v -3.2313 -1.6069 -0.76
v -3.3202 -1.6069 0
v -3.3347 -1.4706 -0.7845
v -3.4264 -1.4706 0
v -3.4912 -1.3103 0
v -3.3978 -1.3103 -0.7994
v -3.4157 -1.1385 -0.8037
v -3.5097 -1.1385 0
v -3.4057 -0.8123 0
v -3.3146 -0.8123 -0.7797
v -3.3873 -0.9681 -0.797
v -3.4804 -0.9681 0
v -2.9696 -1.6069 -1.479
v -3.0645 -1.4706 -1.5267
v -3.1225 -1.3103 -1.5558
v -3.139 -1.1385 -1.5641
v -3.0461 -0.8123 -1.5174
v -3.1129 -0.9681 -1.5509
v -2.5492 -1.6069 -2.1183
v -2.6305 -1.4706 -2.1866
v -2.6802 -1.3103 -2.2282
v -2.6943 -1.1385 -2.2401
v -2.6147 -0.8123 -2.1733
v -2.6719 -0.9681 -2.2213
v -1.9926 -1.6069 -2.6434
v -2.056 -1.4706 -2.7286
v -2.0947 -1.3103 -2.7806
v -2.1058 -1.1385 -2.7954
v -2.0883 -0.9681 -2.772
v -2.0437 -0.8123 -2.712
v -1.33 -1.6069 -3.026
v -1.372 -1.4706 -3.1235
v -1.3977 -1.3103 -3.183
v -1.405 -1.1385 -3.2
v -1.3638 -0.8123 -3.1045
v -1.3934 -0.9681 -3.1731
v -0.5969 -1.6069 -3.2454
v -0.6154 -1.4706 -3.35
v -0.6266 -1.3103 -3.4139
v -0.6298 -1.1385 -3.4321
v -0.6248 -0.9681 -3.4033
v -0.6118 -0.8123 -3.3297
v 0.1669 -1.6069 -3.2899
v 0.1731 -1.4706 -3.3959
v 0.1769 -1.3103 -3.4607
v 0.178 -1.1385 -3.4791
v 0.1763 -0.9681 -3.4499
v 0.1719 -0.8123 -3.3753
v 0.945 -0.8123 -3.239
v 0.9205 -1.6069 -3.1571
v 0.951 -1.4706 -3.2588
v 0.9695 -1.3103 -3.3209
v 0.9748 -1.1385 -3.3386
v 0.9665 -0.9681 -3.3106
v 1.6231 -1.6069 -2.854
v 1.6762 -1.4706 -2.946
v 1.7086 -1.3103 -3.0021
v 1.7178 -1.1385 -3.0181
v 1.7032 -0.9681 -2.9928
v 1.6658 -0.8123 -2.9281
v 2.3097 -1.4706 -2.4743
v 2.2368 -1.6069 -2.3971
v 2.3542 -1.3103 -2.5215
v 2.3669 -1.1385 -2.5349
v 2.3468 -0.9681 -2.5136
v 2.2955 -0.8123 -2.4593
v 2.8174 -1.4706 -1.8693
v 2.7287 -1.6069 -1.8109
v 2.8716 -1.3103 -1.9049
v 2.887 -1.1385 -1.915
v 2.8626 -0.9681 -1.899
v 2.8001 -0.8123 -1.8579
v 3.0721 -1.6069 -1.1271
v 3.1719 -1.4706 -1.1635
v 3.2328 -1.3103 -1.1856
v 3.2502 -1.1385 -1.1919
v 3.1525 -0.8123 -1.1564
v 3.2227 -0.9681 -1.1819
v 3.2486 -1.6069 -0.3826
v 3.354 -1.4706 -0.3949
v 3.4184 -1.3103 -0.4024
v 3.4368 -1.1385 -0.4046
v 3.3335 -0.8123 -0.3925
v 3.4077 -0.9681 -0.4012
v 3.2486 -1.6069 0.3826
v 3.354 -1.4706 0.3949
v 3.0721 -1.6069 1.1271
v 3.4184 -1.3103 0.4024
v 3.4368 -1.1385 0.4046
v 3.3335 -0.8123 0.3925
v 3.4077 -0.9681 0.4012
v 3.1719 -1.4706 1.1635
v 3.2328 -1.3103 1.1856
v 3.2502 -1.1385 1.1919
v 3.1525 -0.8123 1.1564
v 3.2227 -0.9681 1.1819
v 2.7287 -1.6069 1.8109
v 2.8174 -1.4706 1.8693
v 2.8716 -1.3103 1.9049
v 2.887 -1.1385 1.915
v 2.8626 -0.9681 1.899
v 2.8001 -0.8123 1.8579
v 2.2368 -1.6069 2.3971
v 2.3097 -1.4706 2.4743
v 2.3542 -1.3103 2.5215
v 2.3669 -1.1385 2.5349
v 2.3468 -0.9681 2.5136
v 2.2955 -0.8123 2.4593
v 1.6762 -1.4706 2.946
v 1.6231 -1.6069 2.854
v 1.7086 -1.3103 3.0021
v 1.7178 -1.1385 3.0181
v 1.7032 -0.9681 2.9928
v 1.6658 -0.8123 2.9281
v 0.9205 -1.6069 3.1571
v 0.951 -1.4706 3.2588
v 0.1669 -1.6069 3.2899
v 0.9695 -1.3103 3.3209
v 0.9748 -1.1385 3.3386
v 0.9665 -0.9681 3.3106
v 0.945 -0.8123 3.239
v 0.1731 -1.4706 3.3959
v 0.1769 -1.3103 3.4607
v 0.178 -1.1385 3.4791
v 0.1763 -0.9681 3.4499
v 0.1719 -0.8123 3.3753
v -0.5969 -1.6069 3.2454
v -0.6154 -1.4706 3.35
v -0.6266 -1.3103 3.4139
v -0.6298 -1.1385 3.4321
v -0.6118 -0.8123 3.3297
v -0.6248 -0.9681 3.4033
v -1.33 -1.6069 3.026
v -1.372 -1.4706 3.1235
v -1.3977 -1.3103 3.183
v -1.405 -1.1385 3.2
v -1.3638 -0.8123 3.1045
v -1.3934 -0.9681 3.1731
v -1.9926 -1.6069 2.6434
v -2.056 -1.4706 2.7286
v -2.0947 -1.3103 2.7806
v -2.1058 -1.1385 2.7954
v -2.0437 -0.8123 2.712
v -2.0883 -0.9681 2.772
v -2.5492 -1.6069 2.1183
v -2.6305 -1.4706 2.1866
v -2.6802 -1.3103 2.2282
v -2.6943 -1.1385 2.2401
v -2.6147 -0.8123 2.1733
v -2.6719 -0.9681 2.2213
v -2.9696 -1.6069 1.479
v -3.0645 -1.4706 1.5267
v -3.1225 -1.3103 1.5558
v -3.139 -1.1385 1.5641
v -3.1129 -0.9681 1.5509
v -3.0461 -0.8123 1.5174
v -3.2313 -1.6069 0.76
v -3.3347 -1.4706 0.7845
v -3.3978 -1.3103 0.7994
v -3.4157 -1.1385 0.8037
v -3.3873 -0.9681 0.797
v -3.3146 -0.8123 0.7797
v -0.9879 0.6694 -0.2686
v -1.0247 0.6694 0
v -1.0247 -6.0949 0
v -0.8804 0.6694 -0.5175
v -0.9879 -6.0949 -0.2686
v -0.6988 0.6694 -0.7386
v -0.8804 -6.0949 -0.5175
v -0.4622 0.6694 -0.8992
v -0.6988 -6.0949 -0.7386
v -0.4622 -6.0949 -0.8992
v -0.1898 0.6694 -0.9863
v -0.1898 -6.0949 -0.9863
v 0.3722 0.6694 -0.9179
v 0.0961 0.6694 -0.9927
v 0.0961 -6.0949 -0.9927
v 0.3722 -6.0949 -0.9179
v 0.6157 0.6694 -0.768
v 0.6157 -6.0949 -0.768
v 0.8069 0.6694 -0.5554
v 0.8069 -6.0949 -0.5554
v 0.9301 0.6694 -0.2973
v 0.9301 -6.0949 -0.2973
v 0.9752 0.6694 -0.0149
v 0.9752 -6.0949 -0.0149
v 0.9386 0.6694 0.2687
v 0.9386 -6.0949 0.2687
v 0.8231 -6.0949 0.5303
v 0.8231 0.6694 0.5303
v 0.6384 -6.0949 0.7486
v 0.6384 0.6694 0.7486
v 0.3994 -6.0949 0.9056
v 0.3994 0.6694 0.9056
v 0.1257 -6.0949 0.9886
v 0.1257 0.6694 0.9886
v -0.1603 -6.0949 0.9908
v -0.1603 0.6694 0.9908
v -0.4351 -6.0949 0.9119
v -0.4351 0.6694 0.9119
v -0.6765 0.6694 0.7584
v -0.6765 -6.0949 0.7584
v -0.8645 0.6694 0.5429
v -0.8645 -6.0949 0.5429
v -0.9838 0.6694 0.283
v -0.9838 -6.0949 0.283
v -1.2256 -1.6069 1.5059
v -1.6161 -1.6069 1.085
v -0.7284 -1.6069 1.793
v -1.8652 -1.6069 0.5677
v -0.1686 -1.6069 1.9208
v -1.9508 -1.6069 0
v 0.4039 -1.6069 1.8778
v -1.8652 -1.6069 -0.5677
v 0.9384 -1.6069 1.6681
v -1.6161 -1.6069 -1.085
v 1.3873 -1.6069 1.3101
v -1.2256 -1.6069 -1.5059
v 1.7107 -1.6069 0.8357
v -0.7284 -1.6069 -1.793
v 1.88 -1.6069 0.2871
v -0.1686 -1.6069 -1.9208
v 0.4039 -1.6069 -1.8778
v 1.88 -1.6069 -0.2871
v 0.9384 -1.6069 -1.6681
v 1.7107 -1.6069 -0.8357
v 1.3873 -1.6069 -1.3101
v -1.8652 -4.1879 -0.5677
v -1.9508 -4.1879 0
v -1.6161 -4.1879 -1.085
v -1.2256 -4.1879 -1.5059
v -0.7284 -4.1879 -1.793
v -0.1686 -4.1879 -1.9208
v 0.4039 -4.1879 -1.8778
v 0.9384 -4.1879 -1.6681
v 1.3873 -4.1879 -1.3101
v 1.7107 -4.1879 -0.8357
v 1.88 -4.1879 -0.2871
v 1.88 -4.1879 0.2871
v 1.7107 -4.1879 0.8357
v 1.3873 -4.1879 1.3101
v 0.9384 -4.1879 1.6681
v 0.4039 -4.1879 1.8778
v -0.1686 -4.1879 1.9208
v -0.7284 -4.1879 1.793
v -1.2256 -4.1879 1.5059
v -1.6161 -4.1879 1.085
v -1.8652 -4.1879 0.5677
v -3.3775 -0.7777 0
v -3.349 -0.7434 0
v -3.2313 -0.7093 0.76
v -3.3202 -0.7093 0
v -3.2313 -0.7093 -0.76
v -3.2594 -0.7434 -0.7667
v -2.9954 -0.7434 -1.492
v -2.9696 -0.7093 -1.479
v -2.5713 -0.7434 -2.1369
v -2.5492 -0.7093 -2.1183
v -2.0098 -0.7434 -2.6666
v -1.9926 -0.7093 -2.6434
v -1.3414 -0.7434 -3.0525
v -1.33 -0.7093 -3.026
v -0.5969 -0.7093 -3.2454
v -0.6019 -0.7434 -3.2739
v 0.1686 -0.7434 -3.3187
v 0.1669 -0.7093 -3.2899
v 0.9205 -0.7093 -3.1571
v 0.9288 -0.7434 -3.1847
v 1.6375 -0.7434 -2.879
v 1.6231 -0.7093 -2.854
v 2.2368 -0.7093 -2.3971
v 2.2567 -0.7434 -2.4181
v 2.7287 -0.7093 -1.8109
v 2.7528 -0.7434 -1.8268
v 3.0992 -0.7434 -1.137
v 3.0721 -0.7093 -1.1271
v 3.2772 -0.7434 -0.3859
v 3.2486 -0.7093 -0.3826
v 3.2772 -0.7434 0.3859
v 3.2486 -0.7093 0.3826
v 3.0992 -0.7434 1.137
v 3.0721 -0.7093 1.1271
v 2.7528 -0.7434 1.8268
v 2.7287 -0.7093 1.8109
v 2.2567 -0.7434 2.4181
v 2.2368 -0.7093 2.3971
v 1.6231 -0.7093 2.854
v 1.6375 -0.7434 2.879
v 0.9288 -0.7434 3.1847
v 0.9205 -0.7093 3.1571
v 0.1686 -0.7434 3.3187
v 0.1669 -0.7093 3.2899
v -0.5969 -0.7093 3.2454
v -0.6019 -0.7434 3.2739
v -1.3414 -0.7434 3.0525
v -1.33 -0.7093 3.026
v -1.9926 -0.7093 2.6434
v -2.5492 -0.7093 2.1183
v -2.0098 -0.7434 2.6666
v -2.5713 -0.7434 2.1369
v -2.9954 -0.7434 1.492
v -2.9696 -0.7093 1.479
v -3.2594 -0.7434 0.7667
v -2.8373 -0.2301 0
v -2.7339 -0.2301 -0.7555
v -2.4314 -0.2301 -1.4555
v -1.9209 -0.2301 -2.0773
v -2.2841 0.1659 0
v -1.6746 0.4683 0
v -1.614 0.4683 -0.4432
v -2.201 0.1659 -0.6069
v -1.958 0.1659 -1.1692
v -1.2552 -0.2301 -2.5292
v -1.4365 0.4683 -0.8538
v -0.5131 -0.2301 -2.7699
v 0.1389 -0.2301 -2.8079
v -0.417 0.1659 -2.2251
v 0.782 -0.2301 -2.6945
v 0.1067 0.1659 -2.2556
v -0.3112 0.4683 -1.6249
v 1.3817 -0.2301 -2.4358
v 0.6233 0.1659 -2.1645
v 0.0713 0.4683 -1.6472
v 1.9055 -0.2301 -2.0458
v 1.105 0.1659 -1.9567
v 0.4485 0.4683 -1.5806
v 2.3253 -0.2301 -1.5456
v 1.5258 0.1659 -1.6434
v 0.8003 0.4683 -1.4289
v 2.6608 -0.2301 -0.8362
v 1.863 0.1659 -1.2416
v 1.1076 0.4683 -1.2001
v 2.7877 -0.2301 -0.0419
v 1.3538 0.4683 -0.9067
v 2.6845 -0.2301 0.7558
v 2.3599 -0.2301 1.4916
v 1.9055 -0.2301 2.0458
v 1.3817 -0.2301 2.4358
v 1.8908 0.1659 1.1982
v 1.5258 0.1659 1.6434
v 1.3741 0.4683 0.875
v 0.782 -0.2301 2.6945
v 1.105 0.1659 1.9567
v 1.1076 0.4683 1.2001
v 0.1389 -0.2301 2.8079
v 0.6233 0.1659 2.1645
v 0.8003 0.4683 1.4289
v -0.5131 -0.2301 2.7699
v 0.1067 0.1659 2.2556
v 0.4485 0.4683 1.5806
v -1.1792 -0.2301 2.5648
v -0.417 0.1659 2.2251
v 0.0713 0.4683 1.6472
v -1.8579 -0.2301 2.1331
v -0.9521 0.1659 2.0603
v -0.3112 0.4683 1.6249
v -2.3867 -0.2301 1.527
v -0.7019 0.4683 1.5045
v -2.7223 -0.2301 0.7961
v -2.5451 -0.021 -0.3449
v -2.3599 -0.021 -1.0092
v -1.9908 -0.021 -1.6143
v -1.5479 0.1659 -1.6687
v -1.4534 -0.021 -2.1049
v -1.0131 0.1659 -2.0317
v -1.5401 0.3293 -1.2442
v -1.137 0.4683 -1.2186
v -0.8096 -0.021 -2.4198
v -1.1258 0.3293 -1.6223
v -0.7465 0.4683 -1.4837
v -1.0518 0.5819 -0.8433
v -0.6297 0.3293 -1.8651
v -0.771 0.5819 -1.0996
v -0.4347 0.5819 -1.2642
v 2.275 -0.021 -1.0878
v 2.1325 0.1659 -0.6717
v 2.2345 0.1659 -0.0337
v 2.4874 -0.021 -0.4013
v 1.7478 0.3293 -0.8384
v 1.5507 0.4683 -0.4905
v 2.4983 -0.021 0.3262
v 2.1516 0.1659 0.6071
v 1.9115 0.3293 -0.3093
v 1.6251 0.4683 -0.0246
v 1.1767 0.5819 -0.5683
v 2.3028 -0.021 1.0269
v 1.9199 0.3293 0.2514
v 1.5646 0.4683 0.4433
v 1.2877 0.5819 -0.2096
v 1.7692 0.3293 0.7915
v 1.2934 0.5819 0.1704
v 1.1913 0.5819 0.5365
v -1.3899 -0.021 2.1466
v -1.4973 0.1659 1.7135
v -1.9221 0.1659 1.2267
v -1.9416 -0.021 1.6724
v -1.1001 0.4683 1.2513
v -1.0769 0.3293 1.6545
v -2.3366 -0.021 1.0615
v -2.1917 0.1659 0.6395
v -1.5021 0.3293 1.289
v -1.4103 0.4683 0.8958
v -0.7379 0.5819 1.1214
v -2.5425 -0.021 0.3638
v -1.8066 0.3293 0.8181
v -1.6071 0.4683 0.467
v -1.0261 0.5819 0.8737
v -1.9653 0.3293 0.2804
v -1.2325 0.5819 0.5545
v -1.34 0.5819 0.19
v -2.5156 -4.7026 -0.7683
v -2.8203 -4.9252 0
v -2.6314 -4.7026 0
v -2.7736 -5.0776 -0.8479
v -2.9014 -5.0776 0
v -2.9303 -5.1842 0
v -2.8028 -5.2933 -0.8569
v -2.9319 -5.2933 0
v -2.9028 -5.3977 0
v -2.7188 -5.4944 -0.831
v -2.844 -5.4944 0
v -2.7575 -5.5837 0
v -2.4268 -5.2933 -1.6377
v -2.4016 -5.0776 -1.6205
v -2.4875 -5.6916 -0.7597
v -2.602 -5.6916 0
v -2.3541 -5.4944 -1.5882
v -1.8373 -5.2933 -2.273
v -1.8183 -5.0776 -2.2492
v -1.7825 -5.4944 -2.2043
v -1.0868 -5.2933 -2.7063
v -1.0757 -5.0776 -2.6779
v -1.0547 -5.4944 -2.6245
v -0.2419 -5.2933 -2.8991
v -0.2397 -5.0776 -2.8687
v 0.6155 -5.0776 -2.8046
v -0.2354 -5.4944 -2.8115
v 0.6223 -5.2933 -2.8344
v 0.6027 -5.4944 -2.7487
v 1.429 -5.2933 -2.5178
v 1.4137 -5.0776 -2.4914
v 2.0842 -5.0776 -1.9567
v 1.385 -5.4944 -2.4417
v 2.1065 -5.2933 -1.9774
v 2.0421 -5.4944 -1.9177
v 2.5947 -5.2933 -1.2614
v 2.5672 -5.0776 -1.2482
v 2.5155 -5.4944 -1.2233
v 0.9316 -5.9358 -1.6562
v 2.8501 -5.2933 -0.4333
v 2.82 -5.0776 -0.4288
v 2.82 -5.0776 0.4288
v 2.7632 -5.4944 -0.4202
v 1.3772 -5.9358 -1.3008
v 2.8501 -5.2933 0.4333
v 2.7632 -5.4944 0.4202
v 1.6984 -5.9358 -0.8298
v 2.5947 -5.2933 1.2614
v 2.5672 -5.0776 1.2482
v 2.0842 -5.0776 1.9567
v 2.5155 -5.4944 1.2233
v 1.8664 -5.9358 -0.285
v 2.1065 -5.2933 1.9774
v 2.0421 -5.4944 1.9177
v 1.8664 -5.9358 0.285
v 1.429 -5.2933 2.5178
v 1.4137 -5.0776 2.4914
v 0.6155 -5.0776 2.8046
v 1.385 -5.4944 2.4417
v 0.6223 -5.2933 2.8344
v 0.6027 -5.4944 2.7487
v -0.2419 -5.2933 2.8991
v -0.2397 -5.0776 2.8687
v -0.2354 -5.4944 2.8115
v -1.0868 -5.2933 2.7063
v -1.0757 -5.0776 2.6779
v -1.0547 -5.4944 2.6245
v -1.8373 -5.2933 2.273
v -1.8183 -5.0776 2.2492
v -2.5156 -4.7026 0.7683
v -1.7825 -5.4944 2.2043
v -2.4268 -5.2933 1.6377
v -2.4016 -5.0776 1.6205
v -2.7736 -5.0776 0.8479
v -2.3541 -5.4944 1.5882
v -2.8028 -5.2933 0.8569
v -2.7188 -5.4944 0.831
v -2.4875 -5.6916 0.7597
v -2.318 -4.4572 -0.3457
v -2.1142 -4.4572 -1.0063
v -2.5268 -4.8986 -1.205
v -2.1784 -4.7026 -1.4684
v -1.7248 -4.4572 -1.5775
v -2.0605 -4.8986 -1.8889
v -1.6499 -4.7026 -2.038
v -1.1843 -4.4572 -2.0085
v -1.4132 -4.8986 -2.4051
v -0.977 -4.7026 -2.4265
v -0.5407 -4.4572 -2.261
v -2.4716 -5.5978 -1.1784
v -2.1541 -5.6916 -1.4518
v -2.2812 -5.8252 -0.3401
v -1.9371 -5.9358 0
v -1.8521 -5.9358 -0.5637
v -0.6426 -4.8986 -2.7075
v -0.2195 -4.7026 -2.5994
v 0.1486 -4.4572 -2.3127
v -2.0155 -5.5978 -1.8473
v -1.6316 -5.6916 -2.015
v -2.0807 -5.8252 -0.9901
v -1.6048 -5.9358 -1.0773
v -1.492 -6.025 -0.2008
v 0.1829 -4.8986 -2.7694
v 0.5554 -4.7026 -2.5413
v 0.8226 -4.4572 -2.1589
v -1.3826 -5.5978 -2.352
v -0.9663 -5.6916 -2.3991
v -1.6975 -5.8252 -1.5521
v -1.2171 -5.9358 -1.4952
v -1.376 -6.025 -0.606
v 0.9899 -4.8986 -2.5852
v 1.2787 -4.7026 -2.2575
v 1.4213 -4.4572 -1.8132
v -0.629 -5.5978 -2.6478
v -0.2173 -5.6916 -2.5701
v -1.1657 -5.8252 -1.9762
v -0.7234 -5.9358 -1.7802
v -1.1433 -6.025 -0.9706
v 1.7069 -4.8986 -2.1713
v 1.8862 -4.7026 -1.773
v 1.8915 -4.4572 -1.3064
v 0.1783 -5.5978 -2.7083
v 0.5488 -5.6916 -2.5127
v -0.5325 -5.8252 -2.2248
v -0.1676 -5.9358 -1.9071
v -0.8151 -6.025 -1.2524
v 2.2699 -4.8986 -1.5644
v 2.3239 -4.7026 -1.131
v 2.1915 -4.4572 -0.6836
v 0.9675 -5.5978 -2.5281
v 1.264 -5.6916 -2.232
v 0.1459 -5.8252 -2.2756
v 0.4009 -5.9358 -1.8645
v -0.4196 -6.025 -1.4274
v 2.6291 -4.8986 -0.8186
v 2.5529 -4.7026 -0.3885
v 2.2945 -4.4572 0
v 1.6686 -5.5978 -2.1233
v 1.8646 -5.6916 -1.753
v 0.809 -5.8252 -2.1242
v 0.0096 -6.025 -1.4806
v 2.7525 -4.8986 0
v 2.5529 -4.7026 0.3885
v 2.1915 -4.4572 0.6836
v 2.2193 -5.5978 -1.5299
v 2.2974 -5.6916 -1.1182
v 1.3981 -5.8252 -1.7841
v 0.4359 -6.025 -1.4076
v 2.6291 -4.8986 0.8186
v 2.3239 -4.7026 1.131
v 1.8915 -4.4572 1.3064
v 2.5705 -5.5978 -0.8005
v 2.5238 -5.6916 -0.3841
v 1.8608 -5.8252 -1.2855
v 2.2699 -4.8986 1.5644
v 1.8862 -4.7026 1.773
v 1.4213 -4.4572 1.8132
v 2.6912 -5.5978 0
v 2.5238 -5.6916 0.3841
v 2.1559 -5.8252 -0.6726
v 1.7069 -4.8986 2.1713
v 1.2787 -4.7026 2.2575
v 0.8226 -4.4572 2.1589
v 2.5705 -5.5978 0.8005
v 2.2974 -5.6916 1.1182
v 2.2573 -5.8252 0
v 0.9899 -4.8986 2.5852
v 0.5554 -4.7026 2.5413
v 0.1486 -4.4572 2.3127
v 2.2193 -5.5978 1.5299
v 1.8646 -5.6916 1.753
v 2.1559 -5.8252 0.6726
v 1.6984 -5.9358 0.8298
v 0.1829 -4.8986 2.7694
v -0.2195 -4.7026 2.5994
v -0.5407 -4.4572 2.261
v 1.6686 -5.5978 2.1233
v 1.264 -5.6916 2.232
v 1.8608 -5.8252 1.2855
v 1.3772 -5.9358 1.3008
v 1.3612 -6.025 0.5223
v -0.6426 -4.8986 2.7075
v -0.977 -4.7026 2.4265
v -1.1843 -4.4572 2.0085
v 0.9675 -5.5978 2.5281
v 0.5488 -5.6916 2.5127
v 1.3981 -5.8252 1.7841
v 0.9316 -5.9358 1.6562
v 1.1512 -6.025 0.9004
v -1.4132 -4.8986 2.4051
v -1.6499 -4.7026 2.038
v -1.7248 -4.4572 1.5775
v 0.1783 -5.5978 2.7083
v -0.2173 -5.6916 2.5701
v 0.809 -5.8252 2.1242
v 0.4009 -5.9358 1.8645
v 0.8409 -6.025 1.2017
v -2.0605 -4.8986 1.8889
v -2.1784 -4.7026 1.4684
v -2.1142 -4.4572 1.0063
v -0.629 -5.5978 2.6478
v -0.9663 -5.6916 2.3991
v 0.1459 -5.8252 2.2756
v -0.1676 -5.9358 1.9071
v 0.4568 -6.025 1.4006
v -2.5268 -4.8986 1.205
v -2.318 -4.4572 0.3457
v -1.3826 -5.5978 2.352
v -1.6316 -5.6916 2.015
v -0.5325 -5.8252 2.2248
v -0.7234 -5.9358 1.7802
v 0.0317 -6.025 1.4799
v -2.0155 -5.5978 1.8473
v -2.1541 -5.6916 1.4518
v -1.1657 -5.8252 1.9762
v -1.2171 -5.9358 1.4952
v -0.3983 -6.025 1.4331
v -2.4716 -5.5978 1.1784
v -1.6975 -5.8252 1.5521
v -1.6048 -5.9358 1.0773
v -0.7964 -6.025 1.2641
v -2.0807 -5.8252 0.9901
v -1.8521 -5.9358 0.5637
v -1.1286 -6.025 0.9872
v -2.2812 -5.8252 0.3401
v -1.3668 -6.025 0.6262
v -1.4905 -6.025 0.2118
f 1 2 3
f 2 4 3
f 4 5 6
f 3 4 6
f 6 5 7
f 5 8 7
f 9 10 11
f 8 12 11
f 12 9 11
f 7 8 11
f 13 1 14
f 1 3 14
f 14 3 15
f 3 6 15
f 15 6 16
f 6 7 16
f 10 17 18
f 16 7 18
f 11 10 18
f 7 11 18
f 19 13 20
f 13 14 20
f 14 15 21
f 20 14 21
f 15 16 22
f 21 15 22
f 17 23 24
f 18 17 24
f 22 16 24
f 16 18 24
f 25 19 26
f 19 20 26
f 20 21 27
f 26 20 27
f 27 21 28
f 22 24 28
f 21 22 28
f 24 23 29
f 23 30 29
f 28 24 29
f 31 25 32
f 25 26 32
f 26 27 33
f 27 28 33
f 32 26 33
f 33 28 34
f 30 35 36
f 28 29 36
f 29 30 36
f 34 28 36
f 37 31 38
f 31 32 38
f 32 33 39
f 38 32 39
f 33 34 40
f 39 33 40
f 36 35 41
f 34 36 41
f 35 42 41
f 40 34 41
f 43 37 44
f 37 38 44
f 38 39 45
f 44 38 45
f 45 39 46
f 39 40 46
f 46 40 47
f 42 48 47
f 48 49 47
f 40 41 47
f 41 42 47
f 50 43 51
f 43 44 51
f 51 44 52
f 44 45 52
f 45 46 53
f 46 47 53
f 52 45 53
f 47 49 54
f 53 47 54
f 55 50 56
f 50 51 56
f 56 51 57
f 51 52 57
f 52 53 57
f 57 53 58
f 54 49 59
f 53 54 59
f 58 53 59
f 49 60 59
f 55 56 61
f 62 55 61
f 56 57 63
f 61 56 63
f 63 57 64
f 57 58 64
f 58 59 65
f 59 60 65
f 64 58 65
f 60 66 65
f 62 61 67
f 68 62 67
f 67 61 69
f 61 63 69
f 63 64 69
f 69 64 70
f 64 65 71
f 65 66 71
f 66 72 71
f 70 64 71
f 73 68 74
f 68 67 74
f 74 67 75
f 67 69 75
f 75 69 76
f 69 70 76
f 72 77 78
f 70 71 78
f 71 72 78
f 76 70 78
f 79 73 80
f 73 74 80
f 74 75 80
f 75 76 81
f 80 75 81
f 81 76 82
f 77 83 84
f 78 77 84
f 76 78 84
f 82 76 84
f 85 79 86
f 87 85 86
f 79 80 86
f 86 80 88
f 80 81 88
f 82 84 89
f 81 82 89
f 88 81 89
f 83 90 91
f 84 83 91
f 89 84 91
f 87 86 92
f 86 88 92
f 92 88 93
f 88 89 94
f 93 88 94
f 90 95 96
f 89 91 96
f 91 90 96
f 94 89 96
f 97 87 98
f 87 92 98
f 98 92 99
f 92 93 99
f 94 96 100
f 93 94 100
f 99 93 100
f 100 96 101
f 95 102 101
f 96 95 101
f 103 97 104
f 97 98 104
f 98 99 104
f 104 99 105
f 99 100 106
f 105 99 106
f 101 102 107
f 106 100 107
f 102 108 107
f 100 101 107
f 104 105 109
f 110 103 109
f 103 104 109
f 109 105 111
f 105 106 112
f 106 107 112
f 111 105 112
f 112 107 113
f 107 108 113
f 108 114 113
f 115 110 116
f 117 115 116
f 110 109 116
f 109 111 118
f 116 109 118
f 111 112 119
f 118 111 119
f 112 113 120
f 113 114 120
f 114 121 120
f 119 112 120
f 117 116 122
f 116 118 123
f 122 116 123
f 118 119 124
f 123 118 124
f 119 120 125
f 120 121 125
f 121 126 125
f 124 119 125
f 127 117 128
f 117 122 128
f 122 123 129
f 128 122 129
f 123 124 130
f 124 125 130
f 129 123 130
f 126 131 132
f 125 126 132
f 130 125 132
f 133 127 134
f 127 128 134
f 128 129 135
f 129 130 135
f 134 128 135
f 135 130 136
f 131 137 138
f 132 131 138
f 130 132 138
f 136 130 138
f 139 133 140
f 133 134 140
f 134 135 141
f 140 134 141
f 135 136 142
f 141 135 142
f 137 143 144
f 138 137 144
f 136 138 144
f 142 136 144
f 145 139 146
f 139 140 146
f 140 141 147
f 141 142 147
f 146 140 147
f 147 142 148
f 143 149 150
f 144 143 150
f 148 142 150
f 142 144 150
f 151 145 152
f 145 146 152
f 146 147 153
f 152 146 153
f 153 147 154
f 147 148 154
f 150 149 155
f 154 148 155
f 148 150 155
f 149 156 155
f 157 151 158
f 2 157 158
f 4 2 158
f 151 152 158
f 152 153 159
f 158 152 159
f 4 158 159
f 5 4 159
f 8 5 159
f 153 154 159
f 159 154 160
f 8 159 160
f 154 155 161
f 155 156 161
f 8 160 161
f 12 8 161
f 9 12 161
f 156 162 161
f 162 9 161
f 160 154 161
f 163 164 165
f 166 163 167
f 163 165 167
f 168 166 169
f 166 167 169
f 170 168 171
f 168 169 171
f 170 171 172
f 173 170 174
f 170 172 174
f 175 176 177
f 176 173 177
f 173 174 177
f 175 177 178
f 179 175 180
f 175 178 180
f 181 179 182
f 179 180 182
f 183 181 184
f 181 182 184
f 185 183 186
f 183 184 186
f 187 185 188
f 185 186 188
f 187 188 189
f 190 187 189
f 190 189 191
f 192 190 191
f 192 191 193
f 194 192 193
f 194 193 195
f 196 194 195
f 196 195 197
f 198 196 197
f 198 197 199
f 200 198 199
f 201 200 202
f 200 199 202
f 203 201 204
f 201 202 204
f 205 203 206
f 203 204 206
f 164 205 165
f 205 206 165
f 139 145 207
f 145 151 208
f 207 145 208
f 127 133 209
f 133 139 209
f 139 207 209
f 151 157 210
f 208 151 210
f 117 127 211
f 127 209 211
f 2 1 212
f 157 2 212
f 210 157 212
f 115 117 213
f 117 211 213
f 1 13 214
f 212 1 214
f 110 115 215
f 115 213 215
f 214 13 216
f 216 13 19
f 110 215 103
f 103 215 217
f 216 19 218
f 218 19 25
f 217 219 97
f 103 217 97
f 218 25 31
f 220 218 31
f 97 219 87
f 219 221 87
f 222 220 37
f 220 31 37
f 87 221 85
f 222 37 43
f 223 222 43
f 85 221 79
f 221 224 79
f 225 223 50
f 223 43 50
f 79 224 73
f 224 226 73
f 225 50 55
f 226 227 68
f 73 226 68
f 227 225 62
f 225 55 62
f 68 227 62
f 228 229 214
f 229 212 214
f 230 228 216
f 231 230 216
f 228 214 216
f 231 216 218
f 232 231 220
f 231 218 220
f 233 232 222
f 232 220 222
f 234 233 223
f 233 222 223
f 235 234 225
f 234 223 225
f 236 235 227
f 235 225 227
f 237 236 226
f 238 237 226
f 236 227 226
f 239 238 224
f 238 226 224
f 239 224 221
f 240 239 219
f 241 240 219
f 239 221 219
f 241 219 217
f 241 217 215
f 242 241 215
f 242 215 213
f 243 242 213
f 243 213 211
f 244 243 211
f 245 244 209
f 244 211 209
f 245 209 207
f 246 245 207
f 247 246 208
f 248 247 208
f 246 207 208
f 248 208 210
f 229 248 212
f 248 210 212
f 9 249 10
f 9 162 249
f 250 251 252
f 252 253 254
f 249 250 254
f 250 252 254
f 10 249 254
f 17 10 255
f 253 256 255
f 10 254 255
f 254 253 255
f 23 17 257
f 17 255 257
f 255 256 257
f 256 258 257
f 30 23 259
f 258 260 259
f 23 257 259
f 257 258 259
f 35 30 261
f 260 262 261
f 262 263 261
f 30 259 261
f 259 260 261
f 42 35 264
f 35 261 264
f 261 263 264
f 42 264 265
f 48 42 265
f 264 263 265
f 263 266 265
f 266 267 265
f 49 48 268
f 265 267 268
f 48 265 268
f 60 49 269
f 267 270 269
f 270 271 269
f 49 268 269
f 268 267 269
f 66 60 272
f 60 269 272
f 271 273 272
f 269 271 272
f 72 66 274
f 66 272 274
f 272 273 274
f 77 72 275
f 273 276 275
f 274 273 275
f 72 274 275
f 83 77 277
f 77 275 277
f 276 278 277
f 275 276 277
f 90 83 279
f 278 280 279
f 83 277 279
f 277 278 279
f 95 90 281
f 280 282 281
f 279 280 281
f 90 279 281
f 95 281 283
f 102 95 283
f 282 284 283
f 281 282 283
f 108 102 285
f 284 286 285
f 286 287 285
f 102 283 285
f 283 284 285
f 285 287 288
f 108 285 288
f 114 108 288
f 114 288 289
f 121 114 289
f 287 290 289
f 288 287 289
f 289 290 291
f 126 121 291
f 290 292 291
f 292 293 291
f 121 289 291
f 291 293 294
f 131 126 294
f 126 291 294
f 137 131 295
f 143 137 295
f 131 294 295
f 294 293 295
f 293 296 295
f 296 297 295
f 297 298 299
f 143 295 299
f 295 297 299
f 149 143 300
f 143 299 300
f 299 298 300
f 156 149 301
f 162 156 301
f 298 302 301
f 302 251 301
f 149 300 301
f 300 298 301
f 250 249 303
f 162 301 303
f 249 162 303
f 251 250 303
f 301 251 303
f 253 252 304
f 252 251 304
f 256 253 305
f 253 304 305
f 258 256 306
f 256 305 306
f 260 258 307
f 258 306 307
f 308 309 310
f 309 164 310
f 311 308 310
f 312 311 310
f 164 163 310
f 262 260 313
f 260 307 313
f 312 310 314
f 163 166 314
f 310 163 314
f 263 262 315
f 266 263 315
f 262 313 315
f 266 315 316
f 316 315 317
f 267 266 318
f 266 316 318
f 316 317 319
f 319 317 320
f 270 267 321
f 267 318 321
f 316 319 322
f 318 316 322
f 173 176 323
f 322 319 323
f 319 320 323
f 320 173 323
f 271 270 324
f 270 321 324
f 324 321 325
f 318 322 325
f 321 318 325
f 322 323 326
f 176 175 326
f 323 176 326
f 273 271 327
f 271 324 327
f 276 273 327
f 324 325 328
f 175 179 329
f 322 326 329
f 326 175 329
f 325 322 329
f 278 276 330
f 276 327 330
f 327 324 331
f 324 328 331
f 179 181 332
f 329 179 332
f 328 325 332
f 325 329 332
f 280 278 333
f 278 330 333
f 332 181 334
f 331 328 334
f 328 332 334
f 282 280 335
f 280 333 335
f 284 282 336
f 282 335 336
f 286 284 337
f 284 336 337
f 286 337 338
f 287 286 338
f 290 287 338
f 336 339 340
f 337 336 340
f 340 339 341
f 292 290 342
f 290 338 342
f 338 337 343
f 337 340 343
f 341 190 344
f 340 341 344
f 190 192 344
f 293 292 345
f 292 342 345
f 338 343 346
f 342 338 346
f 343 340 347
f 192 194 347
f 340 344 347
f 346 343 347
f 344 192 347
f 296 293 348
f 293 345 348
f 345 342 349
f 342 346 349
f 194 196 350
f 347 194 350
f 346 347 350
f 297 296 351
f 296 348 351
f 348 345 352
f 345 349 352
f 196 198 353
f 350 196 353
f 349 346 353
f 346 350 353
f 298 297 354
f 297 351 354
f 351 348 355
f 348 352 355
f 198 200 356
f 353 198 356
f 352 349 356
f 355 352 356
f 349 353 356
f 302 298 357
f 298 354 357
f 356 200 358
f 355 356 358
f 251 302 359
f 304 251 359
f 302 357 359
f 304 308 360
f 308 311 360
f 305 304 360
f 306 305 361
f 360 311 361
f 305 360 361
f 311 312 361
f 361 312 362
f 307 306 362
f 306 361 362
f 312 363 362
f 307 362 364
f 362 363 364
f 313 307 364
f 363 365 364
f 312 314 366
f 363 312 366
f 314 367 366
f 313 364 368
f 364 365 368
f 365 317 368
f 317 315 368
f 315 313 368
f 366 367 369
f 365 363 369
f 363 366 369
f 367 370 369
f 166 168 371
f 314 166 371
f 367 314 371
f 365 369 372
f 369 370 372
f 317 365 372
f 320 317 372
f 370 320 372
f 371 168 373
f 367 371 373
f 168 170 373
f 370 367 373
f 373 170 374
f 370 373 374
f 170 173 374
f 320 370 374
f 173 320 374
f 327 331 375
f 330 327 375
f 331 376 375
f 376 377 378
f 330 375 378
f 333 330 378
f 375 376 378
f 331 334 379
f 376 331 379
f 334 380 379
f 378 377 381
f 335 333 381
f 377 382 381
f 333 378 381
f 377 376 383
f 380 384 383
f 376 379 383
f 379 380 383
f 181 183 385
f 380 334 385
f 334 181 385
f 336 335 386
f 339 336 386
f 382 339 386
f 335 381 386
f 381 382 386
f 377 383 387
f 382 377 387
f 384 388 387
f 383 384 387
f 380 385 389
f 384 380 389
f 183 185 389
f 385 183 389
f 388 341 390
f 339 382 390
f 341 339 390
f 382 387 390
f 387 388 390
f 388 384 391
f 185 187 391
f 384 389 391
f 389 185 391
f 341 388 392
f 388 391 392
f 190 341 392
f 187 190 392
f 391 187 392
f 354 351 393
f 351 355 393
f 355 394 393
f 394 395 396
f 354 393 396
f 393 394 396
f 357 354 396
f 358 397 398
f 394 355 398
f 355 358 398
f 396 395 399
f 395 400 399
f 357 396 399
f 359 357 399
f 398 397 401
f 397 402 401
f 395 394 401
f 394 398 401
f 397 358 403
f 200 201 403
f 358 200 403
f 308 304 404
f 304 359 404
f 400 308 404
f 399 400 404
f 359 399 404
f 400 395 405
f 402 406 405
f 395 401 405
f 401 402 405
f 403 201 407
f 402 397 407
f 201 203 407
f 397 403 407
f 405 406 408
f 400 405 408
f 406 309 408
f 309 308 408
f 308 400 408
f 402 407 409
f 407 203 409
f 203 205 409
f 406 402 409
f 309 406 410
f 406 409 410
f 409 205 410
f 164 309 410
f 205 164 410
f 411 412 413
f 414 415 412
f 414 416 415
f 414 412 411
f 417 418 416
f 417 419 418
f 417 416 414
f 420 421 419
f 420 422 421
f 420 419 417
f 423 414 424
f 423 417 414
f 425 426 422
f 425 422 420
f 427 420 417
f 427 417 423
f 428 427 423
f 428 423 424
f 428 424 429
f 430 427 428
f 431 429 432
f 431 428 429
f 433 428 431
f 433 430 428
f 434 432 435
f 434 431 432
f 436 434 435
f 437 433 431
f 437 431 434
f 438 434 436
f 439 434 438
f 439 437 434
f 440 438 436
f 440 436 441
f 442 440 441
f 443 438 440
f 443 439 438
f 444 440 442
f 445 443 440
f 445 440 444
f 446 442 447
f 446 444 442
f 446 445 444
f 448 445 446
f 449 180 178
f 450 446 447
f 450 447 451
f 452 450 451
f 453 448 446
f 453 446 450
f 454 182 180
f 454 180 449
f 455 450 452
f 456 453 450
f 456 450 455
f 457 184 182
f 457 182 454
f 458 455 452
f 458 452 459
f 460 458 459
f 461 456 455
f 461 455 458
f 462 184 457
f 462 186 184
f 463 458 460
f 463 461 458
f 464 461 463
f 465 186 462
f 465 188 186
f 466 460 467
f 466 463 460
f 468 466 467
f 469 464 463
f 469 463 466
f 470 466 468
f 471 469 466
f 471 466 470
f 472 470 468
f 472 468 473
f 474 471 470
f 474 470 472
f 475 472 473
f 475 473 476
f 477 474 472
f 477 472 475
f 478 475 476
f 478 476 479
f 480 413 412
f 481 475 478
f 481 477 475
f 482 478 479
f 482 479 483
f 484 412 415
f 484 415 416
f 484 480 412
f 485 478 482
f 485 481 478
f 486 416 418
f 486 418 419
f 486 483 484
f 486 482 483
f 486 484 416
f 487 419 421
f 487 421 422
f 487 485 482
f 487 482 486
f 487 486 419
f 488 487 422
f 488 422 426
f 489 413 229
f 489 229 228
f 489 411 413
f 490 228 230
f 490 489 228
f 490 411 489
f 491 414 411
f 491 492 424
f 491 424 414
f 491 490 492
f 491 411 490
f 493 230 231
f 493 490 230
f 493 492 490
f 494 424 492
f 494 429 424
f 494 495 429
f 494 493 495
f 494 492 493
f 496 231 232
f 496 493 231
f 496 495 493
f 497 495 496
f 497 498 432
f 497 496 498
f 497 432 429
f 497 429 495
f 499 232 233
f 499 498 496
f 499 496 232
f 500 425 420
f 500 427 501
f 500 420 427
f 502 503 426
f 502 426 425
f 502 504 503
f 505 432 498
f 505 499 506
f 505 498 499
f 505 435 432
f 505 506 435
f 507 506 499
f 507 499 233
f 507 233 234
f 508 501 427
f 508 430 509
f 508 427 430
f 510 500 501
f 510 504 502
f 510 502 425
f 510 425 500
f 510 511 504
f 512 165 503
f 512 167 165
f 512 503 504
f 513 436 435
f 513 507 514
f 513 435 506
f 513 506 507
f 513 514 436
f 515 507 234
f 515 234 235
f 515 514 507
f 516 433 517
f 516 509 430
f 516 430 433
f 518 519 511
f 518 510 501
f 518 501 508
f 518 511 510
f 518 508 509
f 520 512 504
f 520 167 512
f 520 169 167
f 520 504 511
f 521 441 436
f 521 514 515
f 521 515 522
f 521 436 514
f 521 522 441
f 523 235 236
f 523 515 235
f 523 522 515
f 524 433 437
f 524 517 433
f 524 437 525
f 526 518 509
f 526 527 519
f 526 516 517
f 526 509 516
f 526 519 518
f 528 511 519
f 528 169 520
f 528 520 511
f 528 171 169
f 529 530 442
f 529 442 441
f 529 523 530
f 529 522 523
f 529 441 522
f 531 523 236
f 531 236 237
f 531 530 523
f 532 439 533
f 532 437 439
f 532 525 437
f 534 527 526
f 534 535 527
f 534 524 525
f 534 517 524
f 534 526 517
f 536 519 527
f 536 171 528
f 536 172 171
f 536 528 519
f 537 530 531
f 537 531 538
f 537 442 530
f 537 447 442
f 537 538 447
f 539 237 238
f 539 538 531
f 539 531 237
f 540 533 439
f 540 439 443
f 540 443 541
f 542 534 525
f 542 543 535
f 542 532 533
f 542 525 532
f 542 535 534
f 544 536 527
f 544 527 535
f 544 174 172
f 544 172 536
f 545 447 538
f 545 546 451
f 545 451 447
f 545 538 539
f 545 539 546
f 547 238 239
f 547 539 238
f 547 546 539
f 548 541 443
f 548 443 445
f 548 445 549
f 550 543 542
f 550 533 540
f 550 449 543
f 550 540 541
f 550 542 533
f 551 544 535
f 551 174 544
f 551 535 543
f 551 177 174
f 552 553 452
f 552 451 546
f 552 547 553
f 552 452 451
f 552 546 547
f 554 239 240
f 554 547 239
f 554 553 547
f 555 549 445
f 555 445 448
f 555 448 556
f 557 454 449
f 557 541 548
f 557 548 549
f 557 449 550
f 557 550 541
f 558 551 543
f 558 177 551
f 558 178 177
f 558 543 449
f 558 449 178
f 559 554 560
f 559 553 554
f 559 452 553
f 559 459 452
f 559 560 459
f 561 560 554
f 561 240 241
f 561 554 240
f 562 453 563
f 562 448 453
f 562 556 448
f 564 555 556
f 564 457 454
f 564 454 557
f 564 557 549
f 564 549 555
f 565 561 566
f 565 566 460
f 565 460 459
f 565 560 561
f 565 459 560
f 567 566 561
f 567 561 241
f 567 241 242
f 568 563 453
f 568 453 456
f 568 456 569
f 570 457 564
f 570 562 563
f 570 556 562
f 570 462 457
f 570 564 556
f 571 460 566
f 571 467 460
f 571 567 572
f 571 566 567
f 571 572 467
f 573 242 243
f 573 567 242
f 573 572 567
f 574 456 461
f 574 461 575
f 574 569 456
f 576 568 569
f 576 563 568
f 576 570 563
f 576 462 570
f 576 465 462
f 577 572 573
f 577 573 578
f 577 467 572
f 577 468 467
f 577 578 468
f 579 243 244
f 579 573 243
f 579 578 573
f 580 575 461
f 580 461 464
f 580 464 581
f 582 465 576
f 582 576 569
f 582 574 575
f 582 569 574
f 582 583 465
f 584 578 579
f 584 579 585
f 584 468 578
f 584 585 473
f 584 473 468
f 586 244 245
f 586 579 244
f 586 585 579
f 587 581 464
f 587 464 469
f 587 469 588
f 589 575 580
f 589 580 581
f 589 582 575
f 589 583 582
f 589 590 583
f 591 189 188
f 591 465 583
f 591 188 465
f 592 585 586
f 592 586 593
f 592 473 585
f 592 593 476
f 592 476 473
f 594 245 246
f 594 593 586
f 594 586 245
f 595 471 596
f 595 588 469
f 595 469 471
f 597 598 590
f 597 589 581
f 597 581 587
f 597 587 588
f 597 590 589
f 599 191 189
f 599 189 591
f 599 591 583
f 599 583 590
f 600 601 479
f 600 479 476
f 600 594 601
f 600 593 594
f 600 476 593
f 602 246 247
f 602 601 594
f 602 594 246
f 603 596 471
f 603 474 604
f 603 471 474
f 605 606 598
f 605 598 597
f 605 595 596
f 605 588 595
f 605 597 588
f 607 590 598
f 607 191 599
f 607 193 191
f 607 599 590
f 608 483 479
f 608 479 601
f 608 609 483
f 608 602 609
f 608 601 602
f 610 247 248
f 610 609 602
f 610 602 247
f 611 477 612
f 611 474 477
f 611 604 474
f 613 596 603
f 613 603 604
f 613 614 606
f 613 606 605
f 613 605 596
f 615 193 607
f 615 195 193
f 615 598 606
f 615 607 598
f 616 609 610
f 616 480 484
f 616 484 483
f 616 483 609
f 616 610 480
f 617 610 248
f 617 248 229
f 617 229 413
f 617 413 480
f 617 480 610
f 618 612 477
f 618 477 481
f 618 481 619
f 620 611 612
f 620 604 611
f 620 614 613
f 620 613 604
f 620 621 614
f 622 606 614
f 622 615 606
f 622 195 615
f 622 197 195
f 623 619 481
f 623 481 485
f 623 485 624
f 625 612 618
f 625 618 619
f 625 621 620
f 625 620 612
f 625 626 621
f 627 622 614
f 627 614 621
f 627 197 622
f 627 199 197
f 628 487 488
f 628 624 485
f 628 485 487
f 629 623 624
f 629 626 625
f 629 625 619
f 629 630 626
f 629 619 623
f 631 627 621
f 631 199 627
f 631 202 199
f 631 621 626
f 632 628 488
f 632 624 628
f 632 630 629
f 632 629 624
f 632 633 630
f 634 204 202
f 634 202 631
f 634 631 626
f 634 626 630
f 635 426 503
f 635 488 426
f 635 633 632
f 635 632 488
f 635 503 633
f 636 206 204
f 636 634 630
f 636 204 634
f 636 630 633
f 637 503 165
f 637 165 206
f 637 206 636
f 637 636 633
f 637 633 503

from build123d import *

# Parameters (mm, degrees)
SKETCH2_R          = 1
CUT_EXTRUDE2_DEPTH = 9.513842467


with BuildPart() as part:
    # Sketch1 → Revolve1 (revolve)
    with BuildSketch(Plane.XY):
        with BuildLine():
            add(Edge.make_bspline(
                [(1.901469747, -4.187890833), (3.997803393, -5.505352851), (2.40138715, -6.003675185), (0.316595481, -6.158045679)],
                knots=[0, 0, 0, 0, 1, 1, 1, 1], degree=3))
            Line((1.901469747, -4.187890833), (1.901469747, -1.606934047))
            Line((1.901469747, -1.606934047), (3.270835138, -1.606934047))
            ThreePointArc((3.270835138, -1.606934047), (3.457066196, -1.22506293), (3.356353959, -0.812310458))
            ThreePointArc((3.356353959, -0.812310458), (3.314000681, -0.760487314), (3.270835138, -0.709338763))
            ThreePointArc((3.270835138, -0.709338763), (1.788504548, 0.399036147), (-0.024669059, 0.770789271))
            Line((-0.024669059, 0.770789271), (-0.024669059, -6.158045679))
            Line((-0.024669059, -6.158045679), (0.316595481, -6.158045679))
        make_face()
    revolve(axis=Axis((-0.024669059, -4.1454e-05, 0), (0, -1, 0)))

    # Sketch2 → Cut-Extrude2 (cut, through all)
    with BuildSketch(Plane(origin=(0, -6.158045679, 0), x_dir=(-1, 0, 0), z_dir=(0, -1, 0))):
        with Locations((0.024669059, 0)):
            Circle(SKETCH2_R)
    extrude(amount=-CUT_EXTRUDE2_DEPTH, mode=Mode.SUBTRACT)


solid = part.part
